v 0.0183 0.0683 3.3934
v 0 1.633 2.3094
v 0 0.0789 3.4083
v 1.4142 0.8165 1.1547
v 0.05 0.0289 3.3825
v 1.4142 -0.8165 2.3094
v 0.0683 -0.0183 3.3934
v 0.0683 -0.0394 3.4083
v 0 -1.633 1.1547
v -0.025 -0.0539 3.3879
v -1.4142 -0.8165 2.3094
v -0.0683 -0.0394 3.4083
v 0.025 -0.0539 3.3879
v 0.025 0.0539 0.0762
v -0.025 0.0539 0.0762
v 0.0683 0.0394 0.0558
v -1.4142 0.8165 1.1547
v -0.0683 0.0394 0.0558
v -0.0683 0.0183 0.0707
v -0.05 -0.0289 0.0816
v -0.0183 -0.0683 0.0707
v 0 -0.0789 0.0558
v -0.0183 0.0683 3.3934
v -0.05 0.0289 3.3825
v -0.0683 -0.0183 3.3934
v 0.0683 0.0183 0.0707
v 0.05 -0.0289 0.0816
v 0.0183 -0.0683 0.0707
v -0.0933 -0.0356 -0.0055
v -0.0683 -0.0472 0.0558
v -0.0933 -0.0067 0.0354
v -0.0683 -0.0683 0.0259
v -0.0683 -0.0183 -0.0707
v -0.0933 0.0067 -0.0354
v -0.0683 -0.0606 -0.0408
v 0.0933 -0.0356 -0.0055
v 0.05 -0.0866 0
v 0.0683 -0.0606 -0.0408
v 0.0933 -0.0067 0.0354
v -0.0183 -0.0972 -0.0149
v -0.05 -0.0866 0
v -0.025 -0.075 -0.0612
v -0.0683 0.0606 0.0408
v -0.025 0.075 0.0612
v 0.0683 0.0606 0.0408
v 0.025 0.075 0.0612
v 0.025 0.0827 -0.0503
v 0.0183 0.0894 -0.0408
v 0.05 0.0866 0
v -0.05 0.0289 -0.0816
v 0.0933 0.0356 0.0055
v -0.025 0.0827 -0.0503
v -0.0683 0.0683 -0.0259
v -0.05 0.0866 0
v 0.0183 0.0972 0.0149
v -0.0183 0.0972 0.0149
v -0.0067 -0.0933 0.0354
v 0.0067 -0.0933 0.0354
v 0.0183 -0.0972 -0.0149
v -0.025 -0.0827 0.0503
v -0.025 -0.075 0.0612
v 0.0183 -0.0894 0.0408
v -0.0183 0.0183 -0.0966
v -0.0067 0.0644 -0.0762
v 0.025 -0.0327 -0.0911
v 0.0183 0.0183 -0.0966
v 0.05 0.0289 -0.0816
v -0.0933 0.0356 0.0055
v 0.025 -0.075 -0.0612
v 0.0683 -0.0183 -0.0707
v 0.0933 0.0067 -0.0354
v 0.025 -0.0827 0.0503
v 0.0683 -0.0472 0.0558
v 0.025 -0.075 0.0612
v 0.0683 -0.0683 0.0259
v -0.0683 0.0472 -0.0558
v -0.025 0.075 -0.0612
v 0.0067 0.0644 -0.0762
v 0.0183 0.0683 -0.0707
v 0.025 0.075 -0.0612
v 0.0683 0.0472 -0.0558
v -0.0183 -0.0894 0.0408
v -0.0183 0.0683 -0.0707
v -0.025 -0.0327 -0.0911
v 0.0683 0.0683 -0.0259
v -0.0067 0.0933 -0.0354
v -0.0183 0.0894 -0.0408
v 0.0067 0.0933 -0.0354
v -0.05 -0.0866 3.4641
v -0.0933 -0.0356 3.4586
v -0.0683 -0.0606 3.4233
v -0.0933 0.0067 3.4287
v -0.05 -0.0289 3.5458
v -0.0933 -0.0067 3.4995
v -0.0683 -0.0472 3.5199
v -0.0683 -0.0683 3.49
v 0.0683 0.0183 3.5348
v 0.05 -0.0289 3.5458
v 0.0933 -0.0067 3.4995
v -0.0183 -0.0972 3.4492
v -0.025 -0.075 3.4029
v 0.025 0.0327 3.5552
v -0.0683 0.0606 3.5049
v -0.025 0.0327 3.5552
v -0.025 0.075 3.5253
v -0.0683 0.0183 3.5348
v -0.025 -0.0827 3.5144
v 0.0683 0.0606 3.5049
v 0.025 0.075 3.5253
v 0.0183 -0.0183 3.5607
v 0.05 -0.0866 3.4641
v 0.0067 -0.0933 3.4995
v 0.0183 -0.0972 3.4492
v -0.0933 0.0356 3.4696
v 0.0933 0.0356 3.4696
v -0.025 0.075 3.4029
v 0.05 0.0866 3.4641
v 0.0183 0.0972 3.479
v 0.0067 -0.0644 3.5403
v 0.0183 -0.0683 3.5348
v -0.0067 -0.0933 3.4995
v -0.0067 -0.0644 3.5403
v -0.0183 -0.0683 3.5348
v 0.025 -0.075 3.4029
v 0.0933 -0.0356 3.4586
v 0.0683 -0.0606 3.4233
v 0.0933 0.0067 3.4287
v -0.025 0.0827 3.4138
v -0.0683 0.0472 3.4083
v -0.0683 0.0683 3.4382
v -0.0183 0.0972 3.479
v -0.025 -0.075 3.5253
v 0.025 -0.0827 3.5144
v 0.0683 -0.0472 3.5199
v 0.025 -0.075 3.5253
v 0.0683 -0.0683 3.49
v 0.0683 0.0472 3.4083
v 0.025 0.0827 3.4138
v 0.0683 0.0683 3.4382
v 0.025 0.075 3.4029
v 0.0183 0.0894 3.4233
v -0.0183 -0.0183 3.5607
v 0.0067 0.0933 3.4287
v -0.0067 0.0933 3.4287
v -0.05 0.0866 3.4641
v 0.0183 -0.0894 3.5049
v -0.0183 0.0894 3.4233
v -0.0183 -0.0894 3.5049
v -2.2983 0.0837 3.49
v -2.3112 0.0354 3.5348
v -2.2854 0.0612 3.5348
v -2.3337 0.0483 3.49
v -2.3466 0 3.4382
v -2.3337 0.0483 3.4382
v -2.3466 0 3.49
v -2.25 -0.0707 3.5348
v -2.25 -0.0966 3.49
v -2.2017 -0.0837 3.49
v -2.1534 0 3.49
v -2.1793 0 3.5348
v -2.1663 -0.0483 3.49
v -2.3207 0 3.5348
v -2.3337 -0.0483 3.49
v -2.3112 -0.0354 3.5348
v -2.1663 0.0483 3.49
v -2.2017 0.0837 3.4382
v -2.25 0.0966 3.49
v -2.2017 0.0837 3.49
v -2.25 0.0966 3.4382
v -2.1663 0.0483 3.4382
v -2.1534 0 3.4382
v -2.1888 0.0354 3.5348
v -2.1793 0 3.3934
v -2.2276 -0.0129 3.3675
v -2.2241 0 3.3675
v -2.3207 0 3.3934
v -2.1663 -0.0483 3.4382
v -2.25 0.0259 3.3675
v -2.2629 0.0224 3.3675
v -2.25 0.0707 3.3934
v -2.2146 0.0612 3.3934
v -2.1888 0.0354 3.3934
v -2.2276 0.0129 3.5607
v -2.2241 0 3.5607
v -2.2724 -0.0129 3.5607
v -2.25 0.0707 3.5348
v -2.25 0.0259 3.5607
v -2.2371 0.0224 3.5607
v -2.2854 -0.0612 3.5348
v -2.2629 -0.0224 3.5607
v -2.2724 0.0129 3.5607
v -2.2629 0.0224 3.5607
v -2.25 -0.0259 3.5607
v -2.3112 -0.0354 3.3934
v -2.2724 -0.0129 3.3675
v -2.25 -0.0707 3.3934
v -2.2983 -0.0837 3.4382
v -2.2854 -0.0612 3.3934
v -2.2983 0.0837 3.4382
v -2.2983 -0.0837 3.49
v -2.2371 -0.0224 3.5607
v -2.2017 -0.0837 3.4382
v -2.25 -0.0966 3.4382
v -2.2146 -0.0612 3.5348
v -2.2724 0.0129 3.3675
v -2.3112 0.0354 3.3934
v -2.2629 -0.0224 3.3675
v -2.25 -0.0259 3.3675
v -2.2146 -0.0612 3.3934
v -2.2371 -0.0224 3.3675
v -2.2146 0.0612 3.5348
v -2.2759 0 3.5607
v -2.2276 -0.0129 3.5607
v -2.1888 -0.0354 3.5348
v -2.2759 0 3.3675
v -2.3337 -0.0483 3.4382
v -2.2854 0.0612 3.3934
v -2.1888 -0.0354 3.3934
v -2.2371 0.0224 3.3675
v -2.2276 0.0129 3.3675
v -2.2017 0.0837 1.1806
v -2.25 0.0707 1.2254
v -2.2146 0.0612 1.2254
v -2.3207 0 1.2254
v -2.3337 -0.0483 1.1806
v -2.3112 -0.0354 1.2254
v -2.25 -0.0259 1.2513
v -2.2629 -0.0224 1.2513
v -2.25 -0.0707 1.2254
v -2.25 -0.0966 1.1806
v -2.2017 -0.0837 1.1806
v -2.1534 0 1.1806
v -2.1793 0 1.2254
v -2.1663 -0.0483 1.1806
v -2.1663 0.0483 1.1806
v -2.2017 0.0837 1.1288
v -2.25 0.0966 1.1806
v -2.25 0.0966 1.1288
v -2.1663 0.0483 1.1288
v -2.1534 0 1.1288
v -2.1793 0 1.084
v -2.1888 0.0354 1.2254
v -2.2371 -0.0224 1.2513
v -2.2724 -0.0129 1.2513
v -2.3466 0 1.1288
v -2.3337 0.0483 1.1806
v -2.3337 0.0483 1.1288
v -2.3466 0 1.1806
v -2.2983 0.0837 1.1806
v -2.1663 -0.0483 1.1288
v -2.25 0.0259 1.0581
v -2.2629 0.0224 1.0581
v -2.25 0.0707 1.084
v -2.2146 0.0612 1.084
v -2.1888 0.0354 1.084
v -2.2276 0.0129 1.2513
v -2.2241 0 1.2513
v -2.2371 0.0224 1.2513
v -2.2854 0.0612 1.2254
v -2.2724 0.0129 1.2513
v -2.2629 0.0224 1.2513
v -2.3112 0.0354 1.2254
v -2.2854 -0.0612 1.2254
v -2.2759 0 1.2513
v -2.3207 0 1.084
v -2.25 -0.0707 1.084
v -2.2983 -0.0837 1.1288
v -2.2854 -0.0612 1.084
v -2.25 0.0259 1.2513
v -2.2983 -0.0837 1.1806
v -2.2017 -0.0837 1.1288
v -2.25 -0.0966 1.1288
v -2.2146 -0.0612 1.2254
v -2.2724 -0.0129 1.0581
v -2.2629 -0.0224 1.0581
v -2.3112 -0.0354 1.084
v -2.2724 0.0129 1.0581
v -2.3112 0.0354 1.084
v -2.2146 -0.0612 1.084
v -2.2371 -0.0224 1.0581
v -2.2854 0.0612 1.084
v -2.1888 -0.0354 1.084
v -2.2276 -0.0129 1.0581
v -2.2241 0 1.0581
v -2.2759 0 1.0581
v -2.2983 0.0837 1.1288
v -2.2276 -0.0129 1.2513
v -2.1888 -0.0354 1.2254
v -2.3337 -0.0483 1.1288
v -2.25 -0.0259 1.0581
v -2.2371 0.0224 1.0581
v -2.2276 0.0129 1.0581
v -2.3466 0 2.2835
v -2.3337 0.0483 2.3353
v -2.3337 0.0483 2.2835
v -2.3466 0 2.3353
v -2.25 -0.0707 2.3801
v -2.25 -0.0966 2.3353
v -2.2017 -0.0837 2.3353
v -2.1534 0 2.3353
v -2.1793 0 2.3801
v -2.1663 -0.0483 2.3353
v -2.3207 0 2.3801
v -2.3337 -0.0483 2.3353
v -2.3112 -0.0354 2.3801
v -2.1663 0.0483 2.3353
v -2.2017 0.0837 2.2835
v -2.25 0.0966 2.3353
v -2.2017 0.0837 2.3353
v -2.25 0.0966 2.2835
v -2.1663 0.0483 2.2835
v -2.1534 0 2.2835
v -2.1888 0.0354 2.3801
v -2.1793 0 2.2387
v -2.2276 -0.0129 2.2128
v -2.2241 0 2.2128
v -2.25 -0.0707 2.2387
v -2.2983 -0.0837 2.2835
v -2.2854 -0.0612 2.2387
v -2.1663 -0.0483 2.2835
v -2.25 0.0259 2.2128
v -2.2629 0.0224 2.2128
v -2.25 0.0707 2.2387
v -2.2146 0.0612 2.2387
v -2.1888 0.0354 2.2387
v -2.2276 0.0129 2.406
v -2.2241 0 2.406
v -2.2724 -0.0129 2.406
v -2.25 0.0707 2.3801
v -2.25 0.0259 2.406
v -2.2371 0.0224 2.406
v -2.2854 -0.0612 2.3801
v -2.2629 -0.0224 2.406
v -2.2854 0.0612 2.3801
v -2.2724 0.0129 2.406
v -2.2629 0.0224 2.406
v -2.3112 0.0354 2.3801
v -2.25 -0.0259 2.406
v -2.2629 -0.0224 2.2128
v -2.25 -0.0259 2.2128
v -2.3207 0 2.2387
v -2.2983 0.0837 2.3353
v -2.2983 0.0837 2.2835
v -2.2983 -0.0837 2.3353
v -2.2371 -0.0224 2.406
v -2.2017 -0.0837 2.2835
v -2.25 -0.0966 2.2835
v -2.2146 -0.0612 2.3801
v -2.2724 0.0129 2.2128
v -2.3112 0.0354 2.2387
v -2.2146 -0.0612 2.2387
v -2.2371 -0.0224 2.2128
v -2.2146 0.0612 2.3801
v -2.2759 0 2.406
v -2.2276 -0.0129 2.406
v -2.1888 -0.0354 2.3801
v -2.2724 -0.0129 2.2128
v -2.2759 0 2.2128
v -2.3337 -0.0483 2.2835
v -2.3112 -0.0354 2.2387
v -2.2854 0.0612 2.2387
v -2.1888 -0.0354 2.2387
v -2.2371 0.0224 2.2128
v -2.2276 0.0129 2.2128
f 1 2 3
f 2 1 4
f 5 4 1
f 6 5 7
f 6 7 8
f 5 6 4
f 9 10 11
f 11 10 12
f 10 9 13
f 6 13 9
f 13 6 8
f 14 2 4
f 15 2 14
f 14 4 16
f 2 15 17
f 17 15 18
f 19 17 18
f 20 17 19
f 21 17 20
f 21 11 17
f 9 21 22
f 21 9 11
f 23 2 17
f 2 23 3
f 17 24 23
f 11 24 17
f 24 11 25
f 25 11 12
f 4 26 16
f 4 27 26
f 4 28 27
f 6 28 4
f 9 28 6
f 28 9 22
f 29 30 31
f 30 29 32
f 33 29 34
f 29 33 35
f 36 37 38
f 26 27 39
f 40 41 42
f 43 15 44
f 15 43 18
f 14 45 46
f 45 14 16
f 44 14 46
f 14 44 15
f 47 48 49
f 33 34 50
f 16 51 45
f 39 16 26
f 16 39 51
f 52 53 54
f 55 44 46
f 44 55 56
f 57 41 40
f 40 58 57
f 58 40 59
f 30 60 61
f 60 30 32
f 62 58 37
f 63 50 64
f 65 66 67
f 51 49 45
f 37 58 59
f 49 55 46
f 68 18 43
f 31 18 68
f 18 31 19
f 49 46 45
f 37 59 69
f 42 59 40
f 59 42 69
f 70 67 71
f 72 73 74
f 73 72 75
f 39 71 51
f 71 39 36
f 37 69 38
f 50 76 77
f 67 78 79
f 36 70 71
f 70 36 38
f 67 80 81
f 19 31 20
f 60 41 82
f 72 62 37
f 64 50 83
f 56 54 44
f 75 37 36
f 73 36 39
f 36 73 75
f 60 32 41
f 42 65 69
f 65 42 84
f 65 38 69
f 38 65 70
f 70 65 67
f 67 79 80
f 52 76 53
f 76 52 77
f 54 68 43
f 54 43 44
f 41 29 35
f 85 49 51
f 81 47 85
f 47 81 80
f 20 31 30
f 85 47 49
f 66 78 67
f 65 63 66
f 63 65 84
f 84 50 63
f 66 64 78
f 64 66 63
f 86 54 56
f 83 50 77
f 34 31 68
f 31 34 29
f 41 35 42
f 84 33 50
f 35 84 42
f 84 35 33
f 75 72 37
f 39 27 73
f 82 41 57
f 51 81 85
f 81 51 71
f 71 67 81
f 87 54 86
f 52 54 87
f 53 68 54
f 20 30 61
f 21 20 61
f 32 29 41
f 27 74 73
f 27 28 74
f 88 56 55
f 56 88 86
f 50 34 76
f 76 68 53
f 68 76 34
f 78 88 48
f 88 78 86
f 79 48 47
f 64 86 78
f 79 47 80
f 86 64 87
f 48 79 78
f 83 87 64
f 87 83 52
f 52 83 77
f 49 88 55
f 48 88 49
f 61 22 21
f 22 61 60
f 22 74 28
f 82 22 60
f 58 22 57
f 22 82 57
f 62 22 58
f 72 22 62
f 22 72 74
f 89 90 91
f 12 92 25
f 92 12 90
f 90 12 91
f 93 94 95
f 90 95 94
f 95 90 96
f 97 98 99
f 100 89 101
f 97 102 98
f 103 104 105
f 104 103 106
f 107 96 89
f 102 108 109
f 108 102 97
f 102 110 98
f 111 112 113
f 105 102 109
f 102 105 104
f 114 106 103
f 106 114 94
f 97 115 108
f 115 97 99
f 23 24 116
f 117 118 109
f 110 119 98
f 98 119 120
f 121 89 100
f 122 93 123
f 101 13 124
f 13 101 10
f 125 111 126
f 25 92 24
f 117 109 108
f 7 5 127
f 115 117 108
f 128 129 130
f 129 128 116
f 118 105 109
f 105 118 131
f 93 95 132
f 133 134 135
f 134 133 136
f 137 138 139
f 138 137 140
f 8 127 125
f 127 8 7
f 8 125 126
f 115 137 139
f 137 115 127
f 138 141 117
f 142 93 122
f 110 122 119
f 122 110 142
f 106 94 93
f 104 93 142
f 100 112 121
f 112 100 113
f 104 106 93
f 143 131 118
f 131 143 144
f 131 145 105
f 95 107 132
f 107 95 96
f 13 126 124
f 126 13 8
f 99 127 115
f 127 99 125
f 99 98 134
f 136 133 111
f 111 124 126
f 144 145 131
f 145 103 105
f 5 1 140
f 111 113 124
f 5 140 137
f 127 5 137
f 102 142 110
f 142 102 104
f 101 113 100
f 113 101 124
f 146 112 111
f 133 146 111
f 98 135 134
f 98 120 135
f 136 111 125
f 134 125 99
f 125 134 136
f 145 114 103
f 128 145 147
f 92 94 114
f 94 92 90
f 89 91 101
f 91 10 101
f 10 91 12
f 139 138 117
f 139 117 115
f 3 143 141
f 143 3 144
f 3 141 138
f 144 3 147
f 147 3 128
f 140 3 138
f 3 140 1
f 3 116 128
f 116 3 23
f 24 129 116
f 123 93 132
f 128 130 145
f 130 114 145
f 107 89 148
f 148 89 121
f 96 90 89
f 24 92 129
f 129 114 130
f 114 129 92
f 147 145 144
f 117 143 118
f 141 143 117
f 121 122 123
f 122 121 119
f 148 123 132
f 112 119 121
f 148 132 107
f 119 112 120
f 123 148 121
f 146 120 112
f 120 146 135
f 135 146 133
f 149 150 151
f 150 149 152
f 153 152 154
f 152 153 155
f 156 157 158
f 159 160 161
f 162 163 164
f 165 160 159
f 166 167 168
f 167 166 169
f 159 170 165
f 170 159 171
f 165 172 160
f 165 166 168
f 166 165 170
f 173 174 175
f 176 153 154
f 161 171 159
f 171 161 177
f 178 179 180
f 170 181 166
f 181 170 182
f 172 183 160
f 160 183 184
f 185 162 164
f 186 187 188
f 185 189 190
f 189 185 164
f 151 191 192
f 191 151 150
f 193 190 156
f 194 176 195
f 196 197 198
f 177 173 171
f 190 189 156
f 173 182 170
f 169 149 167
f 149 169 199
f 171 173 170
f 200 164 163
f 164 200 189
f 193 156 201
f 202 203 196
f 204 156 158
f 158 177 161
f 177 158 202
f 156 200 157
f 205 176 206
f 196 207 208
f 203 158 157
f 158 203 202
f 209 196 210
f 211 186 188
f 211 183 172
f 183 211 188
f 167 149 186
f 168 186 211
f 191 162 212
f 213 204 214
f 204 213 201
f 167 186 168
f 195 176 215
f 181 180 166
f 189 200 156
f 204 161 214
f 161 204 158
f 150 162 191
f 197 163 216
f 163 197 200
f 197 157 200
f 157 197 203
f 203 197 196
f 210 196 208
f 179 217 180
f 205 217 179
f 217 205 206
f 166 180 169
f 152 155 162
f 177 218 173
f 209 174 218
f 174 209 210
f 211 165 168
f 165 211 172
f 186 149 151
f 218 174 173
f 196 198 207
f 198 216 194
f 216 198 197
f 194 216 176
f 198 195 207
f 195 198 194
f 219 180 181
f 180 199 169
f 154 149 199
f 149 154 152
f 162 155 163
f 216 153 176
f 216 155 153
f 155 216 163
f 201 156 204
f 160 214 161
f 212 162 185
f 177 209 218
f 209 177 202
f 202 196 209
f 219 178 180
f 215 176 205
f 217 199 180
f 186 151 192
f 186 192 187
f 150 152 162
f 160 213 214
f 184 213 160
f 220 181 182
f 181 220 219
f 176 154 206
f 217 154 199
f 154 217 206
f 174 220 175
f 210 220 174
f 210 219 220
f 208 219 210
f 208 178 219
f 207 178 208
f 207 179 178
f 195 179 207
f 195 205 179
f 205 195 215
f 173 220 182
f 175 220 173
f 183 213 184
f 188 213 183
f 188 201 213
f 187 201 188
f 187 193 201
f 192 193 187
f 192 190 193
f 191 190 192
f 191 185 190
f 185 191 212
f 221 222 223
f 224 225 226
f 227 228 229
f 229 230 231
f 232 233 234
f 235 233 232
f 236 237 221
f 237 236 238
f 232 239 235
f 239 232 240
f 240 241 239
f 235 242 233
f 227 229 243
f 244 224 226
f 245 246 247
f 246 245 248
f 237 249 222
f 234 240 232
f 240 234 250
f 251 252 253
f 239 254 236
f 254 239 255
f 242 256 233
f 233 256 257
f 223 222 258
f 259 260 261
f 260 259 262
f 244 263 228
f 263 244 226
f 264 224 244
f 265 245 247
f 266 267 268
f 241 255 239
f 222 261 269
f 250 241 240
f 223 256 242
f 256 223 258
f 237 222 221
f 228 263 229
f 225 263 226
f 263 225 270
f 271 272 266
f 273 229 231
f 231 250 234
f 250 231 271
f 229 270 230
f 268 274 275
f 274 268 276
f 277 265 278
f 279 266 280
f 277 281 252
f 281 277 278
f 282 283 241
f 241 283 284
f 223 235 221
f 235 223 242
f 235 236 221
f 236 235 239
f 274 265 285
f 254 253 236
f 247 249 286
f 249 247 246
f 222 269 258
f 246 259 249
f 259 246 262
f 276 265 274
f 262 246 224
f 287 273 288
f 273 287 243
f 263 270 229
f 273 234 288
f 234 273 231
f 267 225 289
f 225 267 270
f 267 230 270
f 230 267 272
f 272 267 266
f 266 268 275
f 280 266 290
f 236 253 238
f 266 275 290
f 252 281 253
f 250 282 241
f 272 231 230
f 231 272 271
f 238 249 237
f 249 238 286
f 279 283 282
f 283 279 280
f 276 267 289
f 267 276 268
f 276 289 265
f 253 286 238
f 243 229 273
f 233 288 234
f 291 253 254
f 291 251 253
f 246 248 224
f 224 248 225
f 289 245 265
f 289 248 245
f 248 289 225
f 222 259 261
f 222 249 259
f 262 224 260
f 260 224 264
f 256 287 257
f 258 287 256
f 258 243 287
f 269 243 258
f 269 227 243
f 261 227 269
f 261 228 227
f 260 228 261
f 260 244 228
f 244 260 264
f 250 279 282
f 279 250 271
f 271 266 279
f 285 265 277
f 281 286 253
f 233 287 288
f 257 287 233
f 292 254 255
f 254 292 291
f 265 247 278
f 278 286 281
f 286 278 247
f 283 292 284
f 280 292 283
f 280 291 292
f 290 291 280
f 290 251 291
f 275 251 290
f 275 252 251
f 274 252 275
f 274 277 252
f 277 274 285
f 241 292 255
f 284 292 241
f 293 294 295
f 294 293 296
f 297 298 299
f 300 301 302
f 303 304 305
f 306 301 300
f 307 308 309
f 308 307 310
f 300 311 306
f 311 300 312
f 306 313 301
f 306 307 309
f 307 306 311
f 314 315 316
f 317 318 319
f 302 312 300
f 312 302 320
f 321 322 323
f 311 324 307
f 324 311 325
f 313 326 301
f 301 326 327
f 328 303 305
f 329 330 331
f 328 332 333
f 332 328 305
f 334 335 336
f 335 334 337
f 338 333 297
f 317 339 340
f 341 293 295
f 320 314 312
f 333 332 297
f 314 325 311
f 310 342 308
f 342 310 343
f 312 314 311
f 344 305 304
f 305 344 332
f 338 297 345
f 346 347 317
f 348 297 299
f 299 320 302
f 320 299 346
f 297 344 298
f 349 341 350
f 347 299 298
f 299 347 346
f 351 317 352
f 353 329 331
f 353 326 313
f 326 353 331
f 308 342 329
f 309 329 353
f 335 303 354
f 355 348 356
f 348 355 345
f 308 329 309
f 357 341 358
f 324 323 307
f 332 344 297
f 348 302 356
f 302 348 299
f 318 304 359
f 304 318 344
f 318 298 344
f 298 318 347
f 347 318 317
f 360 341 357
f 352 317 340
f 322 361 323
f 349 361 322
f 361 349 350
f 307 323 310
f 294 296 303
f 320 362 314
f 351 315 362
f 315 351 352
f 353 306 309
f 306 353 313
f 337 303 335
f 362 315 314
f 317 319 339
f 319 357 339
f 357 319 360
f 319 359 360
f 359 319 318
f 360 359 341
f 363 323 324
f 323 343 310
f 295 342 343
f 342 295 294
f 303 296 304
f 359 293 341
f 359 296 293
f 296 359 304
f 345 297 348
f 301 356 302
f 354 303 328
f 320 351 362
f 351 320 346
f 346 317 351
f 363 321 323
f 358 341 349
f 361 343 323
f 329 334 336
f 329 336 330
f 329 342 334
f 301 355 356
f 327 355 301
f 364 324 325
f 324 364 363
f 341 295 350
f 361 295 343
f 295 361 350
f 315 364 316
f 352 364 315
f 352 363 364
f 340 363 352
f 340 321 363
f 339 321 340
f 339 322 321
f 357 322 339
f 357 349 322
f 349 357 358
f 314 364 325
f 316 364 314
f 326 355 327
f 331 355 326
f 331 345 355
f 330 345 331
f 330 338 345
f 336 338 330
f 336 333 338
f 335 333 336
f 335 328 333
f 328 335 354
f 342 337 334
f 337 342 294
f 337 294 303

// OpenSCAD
// A module to orient its children for diagonal printing.
// I worked this out with Rex 2024-11-09 while helping him with
// his aluminum extrusion connectors inspired by a video on the
// Slant3D YouTube channel: https://youtu.be/csUGcIPNNkk

module slant3d() {
    rotate([atan(sqrt(2)), 0, 0])
        rotate([0, 0, 45])
            children();
}

// demo:

size = 2;
module dot() { sphere(d=size/10, $fn=12); }

module box() {
    cube(size);
    color("white") dot();
    color("red") translate([size, size, size]) dot();
}

slant3d() { box(); }

// The distance between opposing corners of the box:
dist = sqrt(3*size*size);

offset = -(size + 0.25);

// After slant3d, the highest corner of the box is at z=dist.
translate([offset, 0, dist]) color("green") dot();

// The z-heights of the other corners alternate between
// 1/3*dist and 2/3*dist.
translate([offset, 0, 1/3*dist]) color("yellow") dot();
translate([offset, 0, 2/3*dist]) color("yellow") dot();
